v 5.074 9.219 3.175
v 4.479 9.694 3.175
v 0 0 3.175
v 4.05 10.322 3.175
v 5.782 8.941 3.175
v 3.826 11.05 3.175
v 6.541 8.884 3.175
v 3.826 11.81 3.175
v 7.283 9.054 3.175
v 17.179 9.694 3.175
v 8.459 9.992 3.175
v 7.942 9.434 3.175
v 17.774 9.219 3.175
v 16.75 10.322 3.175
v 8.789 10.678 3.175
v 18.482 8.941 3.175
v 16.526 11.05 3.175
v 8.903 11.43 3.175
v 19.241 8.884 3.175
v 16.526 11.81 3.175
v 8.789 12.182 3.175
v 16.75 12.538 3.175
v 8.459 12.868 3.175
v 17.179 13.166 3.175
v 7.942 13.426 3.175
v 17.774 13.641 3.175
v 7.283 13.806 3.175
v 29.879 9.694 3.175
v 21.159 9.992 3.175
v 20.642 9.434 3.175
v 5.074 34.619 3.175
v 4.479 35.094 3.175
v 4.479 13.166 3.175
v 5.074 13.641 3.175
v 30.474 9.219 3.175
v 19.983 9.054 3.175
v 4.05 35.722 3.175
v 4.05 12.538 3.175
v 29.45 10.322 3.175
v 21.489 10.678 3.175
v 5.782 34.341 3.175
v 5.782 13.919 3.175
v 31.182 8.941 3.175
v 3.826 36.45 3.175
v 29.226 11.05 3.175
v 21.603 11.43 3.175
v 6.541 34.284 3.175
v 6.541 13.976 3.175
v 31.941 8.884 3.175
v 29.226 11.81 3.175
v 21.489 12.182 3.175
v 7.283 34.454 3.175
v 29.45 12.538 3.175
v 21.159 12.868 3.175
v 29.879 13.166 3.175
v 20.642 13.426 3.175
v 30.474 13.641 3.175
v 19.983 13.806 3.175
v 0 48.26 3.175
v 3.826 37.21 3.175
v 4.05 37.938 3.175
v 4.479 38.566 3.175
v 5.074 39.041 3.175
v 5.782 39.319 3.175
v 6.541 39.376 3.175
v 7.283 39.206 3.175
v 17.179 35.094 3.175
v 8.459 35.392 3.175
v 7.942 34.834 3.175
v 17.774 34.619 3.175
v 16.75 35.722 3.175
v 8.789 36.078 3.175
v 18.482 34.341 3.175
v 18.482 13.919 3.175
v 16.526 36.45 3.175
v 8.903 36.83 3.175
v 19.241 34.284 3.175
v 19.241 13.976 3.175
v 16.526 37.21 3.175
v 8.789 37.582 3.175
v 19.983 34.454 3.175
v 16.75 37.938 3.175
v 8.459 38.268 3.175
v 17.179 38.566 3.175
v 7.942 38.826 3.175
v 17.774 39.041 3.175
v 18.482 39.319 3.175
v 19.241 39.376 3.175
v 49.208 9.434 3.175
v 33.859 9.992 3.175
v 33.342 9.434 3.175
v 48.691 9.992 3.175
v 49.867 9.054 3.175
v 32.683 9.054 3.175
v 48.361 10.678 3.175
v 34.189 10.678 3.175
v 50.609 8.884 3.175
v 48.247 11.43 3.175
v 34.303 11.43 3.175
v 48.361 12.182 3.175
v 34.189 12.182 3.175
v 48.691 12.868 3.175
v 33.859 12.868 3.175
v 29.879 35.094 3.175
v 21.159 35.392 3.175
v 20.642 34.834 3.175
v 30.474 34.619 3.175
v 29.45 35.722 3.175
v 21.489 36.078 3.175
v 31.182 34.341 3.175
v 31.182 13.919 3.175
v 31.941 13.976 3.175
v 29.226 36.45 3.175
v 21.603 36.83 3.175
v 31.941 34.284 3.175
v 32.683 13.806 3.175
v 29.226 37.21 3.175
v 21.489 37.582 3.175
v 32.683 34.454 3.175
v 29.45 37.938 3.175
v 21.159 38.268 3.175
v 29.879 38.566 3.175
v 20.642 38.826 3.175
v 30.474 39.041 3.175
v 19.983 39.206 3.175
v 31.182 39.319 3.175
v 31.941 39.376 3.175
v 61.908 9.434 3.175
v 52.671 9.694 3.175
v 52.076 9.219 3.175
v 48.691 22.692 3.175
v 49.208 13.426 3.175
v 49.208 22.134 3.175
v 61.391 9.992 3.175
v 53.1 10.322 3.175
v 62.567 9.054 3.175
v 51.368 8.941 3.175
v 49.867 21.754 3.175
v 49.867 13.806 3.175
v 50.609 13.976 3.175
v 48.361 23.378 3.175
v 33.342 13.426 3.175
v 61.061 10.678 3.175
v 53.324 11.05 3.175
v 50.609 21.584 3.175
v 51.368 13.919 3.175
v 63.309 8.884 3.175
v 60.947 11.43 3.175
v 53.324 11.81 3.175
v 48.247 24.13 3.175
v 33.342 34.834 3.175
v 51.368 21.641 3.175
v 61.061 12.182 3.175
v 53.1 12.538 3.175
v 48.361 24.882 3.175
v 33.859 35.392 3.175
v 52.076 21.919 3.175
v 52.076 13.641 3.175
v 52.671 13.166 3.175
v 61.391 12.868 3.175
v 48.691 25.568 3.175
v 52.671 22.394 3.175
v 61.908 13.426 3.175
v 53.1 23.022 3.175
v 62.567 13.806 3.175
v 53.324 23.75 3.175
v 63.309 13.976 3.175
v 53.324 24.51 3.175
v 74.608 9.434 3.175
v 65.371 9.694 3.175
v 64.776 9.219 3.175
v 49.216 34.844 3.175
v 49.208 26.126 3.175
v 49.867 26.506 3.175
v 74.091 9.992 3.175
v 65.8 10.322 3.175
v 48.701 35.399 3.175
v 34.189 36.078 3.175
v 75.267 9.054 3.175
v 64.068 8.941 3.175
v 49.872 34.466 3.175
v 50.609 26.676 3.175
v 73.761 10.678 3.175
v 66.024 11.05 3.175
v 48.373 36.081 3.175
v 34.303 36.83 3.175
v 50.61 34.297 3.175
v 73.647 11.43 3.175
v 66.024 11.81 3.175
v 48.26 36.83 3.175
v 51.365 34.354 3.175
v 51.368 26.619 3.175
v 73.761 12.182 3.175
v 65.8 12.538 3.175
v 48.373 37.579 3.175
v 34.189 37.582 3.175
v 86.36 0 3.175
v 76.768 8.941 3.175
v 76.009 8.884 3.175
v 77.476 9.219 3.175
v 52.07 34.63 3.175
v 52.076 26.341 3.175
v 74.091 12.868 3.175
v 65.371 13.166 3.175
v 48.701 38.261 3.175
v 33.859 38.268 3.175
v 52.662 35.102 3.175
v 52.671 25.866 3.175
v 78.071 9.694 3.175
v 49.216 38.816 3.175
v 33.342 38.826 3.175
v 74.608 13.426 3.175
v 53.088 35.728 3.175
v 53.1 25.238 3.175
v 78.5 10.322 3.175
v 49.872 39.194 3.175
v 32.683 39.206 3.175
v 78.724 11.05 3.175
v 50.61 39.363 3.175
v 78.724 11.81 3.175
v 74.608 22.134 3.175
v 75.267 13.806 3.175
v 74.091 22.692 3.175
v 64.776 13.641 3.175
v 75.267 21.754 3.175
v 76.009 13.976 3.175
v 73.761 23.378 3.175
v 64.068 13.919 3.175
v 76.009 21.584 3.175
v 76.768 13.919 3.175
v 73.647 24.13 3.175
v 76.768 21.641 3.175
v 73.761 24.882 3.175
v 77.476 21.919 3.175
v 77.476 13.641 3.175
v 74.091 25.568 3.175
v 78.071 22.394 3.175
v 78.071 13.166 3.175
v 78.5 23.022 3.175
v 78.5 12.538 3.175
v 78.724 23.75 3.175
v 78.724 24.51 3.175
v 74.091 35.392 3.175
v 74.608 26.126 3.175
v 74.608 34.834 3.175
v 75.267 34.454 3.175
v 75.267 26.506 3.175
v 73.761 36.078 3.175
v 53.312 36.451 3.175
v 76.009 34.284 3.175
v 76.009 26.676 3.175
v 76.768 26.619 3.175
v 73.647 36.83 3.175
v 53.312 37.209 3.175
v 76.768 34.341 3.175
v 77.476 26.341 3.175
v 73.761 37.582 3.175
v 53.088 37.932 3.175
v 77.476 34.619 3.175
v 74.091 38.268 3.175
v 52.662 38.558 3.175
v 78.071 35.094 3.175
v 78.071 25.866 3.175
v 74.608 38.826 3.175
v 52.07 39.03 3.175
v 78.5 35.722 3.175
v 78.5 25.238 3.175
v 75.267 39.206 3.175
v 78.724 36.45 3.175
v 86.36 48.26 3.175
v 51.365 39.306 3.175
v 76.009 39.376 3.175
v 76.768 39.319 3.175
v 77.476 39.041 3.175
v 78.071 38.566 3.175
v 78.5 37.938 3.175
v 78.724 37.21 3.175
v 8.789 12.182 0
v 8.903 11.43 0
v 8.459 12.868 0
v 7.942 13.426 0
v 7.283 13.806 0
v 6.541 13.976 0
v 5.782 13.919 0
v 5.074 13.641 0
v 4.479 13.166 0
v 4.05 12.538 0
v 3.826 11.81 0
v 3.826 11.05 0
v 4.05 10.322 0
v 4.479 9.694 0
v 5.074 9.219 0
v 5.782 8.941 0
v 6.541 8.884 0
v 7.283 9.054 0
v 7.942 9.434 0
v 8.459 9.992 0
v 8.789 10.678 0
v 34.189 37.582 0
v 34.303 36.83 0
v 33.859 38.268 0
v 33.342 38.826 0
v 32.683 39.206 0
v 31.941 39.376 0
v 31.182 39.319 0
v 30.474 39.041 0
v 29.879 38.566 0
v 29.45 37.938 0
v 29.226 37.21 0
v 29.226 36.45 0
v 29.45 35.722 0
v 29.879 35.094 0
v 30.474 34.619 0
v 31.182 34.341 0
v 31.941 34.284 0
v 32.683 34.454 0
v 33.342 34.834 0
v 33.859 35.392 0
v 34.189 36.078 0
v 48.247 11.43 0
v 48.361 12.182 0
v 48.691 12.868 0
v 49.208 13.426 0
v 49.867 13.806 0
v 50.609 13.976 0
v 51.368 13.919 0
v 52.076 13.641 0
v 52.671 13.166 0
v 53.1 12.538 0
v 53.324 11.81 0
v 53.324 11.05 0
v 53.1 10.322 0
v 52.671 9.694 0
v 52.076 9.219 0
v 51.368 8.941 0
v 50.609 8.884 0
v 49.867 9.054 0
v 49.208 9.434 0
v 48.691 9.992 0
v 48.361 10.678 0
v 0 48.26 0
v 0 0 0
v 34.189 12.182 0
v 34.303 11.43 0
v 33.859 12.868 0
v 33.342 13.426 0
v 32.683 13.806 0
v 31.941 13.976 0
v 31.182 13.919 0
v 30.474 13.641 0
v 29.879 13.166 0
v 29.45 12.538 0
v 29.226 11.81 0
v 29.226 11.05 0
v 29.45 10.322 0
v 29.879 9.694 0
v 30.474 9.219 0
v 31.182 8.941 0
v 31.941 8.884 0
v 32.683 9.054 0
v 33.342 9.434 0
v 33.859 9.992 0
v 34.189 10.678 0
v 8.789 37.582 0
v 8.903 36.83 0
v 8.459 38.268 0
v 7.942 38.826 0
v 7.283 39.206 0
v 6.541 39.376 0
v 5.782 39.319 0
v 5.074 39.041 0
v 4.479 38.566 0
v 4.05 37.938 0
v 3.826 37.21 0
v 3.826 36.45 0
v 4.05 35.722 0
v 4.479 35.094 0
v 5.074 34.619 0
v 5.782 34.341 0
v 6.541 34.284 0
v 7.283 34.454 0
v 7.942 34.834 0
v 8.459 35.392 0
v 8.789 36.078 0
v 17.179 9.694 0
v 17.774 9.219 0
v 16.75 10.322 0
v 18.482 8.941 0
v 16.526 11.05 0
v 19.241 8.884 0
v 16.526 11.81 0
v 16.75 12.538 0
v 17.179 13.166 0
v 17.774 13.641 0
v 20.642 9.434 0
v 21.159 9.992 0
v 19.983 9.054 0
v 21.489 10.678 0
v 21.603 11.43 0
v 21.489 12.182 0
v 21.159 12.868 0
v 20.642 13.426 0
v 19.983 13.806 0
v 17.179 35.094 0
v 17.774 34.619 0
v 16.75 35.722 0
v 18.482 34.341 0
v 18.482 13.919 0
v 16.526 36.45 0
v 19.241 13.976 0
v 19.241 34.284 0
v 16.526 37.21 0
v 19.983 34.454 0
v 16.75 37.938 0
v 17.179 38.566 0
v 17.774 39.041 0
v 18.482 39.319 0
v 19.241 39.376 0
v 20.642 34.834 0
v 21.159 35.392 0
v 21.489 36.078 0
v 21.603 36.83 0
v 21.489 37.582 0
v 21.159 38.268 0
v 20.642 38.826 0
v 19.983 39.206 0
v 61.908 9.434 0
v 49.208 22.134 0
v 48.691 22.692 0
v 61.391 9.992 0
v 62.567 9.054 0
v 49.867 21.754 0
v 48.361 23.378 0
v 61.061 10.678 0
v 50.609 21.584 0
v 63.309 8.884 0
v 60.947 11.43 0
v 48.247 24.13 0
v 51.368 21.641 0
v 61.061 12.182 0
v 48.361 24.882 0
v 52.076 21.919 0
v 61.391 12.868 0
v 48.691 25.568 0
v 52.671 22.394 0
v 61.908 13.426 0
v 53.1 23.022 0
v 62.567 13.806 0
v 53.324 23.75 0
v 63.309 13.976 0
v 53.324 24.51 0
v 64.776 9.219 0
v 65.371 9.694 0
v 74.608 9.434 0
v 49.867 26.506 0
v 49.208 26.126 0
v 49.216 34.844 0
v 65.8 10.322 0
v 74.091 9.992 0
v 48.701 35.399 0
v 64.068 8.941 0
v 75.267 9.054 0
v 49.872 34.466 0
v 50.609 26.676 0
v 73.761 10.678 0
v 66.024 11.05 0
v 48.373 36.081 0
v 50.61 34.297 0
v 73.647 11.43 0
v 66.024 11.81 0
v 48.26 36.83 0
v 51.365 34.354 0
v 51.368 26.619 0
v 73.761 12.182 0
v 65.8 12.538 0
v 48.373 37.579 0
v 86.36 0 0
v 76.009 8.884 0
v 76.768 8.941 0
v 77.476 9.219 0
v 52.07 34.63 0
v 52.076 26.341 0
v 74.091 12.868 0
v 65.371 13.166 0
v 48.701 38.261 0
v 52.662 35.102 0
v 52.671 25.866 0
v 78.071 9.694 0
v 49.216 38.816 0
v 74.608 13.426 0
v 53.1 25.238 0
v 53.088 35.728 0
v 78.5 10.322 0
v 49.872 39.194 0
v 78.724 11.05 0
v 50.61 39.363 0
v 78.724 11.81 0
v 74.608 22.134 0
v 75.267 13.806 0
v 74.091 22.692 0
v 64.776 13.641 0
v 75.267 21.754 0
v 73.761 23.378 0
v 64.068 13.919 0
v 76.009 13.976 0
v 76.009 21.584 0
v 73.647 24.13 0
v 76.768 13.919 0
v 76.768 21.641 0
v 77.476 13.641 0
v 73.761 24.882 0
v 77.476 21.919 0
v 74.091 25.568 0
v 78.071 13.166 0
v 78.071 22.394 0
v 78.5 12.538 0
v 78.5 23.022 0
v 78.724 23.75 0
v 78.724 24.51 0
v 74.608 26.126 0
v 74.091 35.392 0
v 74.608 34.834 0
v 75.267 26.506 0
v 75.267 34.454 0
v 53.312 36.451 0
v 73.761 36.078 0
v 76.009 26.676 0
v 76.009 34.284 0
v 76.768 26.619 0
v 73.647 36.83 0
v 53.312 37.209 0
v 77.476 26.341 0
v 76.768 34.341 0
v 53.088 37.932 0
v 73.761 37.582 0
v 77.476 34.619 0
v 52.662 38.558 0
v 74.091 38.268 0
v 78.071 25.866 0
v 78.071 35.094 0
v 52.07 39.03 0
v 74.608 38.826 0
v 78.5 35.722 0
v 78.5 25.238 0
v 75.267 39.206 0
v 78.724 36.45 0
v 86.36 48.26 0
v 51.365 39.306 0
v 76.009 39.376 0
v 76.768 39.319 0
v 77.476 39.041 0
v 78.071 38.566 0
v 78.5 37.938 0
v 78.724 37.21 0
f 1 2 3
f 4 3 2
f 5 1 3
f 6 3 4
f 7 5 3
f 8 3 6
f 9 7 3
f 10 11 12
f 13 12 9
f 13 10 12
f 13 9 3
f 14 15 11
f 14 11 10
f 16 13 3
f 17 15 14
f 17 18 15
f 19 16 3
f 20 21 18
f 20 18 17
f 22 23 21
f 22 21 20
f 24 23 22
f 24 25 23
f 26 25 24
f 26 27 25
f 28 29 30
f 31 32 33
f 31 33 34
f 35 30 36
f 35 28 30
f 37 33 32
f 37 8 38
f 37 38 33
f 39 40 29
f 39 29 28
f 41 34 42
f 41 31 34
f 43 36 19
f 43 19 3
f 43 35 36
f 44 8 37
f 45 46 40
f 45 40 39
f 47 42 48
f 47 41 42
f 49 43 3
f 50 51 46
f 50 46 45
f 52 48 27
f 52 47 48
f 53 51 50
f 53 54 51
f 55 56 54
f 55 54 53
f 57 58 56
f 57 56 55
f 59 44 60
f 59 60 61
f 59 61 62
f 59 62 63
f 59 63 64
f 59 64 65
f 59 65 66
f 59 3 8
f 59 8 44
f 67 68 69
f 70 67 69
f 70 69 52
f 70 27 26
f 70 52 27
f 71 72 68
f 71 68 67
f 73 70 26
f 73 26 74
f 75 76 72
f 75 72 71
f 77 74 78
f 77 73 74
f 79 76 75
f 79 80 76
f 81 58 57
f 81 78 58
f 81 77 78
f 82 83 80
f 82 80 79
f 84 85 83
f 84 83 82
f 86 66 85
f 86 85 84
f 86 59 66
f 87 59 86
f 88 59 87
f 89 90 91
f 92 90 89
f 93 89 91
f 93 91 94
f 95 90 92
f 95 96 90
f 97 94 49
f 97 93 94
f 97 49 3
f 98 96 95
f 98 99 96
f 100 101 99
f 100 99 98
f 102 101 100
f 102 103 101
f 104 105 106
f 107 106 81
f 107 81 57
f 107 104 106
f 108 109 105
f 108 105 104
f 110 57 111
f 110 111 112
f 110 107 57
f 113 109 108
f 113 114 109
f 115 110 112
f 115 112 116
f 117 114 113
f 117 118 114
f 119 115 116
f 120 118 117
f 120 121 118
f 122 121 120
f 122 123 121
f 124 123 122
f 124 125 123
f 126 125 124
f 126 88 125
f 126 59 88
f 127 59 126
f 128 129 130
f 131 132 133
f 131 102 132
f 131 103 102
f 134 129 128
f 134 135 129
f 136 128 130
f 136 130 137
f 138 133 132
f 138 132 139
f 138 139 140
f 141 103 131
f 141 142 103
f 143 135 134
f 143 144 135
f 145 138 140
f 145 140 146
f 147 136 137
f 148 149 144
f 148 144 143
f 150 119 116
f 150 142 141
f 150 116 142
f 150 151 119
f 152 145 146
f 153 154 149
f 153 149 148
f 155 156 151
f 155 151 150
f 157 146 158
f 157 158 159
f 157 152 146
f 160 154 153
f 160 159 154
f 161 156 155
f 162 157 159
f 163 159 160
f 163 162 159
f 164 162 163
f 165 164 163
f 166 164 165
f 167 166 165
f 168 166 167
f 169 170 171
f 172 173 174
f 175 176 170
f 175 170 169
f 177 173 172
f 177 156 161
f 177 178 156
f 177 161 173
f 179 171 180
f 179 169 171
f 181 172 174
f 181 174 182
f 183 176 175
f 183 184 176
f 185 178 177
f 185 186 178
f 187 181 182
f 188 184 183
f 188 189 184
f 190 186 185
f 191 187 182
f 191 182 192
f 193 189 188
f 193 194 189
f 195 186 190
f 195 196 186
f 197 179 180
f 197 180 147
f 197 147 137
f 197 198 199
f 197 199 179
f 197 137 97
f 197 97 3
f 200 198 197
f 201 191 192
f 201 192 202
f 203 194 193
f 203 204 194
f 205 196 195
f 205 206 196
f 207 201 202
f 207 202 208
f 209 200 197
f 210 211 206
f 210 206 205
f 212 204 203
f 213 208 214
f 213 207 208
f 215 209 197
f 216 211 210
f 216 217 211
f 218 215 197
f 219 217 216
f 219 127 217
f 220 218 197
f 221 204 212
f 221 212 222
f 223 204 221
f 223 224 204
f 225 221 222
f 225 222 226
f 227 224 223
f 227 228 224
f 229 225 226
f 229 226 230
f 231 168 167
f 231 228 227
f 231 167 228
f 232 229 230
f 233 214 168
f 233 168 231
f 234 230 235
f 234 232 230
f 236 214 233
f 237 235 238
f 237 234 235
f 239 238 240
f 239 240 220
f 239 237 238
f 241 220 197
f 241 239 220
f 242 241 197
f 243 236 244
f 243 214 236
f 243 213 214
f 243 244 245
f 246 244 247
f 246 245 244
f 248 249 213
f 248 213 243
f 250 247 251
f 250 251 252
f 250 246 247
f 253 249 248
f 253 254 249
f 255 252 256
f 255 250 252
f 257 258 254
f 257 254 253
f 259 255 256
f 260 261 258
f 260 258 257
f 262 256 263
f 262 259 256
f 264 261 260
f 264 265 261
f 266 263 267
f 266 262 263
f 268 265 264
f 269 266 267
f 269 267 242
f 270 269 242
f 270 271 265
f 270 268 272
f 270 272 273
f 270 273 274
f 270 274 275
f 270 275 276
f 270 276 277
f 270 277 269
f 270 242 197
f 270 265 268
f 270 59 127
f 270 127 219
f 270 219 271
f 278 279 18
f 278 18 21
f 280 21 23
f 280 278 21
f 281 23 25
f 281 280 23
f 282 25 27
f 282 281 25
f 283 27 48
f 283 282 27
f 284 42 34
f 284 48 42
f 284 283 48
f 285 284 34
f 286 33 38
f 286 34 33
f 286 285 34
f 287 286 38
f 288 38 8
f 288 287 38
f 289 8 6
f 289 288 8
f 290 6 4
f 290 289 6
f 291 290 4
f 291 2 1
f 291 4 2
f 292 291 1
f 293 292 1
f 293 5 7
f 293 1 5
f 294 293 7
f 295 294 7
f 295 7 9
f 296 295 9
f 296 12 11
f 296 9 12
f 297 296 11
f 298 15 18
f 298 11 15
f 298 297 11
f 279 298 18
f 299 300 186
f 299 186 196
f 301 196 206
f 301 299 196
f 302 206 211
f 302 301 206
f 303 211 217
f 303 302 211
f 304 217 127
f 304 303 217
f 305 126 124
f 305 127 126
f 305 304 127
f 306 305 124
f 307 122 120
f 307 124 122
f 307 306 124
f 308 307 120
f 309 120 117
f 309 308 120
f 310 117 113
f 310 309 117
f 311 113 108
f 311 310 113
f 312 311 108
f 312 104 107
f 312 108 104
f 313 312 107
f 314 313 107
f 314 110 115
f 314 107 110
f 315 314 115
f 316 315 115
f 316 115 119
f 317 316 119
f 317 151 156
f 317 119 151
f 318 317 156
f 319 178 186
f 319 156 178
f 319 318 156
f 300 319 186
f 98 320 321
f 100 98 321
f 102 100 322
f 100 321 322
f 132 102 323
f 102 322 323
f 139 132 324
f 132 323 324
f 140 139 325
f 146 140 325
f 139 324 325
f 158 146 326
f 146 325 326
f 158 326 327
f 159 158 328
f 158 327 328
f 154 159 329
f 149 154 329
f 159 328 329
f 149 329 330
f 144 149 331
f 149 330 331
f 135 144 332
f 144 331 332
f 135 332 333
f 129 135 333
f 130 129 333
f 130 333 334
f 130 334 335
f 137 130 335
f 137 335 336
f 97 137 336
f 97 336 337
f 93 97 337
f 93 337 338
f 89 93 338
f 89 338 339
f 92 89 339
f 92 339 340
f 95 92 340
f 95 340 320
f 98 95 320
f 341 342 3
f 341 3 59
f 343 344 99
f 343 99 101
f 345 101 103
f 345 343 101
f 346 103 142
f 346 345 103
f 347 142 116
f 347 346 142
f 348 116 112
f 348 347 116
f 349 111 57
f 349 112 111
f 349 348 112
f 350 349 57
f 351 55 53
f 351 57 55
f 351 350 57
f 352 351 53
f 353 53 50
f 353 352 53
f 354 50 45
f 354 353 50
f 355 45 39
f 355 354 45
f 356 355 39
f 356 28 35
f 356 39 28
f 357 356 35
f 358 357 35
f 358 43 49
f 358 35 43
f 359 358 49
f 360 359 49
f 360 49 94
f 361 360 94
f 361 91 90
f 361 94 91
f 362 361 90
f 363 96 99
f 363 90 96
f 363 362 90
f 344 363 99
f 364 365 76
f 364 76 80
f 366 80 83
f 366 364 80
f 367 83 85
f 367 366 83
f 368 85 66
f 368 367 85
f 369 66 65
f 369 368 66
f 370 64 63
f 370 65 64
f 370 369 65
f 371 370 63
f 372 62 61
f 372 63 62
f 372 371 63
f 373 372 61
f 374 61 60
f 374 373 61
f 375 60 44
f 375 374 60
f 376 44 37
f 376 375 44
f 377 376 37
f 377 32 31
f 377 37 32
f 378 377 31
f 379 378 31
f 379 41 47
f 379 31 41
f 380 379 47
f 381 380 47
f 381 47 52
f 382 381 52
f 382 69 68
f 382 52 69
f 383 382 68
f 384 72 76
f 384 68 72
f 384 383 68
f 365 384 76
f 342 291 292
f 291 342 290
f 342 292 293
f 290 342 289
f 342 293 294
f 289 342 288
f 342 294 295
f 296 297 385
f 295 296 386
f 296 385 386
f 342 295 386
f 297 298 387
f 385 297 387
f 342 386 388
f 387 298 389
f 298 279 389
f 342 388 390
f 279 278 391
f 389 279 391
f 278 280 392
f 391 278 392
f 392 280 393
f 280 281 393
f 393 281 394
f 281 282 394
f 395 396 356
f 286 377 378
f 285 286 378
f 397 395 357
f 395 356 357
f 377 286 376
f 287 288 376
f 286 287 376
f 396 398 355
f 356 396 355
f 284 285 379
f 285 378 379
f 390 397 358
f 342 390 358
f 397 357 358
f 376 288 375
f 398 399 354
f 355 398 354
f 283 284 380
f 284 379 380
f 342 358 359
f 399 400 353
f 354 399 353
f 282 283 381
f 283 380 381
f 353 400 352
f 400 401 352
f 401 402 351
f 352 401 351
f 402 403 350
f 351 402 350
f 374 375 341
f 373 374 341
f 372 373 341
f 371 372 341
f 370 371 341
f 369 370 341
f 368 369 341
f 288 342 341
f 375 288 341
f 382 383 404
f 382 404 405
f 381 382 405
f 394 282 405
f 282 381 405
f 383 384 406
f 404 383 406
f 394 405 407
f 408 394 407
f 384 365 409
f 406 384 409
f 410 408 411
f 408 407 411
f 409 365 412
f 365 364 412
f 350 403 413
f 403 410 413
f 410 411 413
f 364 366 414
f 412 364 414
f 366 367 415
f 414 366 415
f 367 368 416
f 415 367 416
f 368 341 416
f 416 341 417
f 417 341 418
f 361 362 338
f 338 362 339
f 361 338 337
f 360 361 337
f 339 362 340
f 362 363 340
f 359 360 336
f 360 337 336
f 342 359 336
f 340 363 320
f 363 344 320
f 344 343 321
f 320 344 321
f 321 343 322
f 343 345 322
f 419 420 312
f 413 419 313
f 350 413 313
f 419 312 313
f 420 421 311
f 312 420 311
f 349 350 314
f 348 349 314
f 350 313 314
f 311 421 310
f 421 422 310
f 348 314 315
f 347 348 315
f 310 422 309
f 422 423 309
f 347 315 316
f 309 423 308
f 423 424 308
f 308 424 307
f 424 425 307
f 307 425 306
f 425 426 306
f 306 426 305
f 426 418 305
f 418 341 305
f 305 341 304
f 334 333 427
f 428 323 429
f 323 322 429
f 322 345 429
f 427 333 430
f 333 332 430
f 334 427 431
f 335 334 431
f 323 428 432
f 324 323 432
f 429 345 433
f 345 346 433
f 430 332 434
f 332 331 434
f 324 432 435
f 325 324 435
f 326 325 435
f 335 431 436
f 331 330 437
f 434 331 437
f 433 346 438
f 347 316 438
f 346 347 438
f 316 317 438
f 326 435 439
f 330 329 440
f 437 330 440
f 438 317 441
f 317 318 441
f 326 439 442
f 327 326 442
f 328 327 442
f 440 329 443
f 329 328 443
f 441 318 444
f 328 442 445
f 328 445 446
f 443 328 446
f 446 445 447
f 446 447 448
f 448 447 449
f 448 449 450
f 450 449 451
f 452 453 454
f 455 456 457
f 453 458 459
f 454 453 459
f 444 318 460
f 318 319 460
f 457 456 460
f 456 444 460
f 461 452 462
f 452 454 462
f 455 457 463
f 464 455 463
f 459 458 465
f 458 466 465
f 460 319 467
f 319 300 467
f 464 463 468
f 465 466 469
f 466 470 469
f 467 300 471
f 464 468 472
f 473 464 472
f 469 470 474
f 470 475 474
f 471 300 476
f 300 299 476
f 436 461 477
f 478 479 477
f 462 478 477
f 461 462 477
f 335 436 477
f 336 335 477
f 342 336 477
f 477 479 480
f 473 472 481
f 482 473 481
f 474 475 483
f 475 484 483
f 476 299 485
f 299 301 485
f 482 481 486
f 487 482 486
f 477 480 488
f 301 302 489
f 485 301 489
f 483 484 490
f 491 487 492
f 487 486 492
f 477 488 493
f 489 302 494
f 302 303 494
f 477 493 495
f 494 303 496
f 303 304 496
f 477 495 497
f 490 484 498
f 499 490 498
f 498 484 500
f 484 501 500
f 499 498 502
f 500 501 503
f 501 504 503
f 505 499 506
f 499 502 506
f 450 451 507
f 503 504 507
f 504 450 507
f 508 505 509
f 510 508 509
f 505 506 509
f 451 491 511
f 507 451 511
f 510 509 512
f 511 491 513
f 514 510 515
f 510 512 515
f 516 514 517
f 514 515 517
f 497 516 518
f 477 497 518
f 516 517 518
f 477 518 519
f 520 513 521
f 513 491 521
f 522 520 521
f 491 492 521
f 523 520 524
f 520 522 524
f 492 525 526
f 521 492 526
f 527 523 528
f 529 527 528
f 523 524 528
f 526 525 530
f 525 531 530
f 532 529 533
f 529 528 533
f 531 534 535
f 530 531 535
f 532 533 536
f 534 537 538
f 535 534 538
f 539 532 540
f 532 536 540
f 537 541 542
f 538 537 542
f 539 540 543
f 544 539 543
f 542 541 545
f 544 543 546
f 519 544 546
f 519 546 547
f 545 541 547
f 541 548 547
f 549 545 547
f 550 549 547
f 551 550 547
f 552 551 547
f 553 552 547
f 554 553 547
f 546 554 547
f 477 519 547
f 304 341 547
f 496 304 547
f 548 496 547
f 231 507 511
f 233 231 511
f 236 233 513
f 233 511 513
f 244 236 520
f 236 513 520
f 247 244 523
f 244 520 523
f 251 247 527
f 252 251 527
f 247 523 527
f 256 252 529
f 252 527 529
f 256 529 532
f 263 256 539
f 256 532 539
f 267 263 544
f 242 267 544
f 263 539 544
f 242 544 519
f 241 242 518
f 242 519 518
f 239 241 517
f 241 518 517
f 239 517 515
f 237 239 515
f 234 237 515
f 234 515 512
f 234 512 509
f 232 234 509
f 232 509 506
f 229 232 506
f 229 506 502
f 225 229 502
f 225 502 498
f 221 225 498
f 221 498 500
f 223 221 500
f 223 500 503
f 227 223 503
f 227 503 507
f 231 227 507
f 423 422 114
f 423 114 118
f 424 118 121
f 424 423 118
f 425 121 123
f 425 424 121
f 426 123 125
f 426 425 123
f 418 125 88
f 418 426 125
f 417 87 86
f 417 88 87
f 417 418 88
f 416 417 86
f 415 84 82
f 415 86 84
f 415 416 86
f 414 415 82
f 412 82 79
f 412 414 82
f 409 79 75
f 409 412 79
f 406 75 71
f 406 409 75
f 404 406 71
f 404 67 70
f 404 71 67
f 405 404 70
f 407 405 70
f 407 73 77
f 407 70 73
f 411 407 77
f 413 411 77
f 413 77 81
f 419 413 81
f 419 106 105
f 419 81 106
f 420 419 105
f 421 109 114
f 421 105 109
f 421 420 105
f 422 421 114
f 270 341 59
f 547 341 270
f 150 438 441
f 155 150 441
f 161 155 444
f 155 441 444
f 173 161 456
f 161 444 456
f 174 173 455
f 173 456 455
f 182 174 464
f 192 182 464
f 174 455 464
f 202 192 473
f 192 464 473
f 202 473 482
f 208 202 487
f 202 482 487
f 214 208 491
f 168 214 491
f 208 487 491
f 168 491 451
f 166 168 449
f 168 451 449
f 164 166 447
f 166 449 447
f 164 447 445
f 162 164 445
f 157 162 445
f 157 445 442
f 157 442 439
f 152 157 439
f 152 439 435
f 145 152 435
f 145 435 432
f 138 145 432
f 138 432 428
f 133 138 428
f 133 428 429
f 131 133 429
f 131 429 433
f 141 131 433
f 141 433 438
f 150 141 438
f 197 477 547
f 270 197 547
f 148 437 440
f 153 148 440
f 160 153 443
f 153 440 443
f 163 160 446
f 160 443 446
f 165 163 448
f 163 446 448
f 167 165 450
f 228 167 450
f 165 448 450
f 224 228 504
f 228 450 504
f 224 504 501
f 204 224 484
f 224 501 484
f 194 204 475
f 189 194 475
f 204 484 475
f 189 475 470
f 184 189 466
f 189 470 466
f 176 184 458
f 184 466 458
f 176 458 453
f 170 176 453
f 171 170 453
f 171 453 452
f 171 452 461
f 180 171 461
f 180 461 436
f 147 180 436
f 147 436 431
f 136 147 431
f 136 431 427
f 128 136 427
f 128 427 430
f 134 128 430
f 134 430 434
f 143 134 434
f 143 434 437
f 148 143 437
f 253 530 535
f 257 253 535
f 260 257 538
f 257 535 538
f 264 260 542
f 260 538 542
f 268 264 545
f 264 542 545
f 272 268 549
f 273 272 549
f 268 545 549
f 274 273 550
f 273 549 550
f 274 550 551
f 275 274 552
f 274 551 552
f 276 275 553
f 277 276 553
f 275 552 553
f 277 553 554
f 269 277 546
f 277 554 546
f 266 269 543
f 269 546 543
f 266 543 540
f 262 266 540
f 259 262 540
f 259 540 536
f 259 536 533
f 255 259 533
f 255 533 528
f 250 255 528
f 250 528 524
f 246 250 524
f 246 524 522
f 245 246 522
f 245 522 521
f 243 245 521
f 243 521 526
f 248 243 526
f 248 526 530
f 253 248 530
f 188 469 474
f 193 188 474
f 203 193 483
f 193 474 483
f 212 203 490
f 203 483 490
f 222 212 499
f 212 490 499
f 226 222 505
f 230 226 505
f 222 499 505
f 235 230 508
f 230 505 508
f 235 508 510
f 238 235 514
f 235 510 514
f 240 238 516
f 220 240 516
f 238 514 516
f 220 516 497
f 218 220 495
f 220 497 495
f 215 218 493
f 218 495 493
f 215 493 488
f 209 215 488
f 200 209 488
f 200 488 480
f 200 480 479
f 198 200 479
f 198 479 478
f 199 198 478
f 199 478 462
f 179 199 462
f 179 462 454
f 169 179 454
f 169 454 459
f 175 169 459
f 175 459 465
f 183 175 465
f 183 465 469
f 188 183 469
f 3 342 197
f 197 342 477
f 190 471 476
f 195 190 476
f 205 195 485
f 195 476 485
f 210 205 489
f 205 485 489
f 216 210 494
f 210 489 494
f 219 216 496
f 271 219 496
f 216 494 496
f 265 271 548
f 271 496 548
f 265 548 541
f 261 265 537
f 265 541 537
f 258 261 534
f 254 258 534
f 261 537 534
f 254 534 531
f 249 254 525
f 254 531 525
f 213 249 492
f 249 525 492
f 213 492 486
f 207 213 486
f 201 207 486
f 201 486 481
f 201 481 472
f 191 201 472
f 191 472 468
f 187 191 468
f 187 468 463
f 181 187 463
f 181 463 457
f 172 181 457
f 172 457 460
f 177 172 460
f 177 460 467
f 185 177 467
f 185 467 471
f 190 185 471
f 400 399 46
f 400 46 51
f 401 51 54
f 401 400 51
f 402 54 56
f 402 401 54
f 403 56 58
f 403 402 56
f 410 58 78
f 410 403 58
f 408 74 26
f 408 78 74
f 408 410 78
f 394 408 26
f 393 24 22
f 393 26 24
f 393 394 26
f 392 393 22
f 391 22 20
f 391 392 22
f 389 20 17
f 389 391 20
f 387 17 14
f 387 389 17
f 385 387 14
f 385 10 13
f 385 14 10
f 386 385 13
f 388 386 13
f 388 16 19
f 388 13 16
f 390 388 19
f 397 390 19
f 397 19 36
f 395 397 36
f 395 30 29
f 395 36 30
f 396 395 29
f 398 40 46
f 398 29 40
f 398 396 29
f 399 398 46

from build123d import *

# Parameters (mm, degrees)
SKETCH1_W               = 86.36
SKETCH1_H               = 48.26
BOSS_EXTRUDE1_DEPTH     = 3.175
CUT_EXTRUDE1_DEPTH      = 99.980593174
CUT_EXTRUDE1_DEPTH_BACK = 99.980593174
SKETCH2_R               = 2.5527
SKETCH3_R               = 2.5527
SKETCH3_R_2             = 2.54
CUT_EXTRUDE2_DEPTH      = 99.980593174
SKETCH4_R               = 2.5527
CUT_EXTRUDE3_DEPTH      = 99.980593174


with BuildPart() as part:
    # Sketch1 → Boss-Extrude1 (new body)
    with BuildSketch(Plane.XY):
        with Locations((43.18, 24.13)):
            Rectangle(SKETCH1_W, SKETCH1_H)
    extrude(amount=BOSS_EXTRUDE1_DEPTH)

    # Sketch2 → Cut-Extrude1 (cut, two sides: drawn at the far end of the back side and taken through both)
    with BuildSketch(Plane.XY.offset(3.175).offset(-CUT_EXTRUDE1_DEPTH_BACK)):
        with Locations((6.35, 36.83)):
            Circle(SKETCH2_R)
        with Locations((6.35, 11.43)):
            Circle(SKETCH2_R)
        with Locations((19.05, 36.83)):
            Circle(SKETCH2_R)
        with Locations((19.05, 11.43)):
            Circle(SKETCH2_R)
        with Locations((31.75, 36.83)):
            Circle(SKETCH2_R)
        with Locations((31.75, 11.43)):
            Circle(SKETCH2_R)
    extrude(amount=CUT_EXTRUDE1_DEPTH + CUT_EXTRUDE1_DEPTH_BACK, mode=Mode.SUBTRACT)

    # Sketch3 → Cut-Extrude2 (cut, through all)
    with BuildSketch(Plane(origin=(0, 0, 0), x_dir=(-1, 0, 0), z_dir=(0, 0, -1))):
        with Locations((-76.2, 36.83)):
            Circle(SKETCH3_R)
        with Locations((-76.2, 24.13)):
            Circle(SKETCH3_R)
        with Locations((-50.8, 36.83)):
            Circle(SKETCH3_R_2)
        with Locations((-50.8, 24.13)):
            Circle(SKETCH3_R)
    extrude(amount=-CUT_EXTRUDE2_DEPTH, mode=Mode.SUBTRACT)

    # Sketch4 → Cut-Extrude3 (cut, through all)
    with BuildSketch(Plane(origin=(0, 0, 0), x_dir=(-1, 0, 0), z_dir=(0, 0, -1))):
        with Locations((-76.2, 11.43)):
            Circle(SKETCH4_R)
        with Locations((-63.5, 11.43)):
            Circle(SKETCH4_R)
        with Locations((-50.8, 11.43)):
            Circle(SKETCH4_R)
    extrude(amount=-CUT_EXTRUDE3_DEPTH, mode=Mode.SUBTRACT)


solid = part.part
